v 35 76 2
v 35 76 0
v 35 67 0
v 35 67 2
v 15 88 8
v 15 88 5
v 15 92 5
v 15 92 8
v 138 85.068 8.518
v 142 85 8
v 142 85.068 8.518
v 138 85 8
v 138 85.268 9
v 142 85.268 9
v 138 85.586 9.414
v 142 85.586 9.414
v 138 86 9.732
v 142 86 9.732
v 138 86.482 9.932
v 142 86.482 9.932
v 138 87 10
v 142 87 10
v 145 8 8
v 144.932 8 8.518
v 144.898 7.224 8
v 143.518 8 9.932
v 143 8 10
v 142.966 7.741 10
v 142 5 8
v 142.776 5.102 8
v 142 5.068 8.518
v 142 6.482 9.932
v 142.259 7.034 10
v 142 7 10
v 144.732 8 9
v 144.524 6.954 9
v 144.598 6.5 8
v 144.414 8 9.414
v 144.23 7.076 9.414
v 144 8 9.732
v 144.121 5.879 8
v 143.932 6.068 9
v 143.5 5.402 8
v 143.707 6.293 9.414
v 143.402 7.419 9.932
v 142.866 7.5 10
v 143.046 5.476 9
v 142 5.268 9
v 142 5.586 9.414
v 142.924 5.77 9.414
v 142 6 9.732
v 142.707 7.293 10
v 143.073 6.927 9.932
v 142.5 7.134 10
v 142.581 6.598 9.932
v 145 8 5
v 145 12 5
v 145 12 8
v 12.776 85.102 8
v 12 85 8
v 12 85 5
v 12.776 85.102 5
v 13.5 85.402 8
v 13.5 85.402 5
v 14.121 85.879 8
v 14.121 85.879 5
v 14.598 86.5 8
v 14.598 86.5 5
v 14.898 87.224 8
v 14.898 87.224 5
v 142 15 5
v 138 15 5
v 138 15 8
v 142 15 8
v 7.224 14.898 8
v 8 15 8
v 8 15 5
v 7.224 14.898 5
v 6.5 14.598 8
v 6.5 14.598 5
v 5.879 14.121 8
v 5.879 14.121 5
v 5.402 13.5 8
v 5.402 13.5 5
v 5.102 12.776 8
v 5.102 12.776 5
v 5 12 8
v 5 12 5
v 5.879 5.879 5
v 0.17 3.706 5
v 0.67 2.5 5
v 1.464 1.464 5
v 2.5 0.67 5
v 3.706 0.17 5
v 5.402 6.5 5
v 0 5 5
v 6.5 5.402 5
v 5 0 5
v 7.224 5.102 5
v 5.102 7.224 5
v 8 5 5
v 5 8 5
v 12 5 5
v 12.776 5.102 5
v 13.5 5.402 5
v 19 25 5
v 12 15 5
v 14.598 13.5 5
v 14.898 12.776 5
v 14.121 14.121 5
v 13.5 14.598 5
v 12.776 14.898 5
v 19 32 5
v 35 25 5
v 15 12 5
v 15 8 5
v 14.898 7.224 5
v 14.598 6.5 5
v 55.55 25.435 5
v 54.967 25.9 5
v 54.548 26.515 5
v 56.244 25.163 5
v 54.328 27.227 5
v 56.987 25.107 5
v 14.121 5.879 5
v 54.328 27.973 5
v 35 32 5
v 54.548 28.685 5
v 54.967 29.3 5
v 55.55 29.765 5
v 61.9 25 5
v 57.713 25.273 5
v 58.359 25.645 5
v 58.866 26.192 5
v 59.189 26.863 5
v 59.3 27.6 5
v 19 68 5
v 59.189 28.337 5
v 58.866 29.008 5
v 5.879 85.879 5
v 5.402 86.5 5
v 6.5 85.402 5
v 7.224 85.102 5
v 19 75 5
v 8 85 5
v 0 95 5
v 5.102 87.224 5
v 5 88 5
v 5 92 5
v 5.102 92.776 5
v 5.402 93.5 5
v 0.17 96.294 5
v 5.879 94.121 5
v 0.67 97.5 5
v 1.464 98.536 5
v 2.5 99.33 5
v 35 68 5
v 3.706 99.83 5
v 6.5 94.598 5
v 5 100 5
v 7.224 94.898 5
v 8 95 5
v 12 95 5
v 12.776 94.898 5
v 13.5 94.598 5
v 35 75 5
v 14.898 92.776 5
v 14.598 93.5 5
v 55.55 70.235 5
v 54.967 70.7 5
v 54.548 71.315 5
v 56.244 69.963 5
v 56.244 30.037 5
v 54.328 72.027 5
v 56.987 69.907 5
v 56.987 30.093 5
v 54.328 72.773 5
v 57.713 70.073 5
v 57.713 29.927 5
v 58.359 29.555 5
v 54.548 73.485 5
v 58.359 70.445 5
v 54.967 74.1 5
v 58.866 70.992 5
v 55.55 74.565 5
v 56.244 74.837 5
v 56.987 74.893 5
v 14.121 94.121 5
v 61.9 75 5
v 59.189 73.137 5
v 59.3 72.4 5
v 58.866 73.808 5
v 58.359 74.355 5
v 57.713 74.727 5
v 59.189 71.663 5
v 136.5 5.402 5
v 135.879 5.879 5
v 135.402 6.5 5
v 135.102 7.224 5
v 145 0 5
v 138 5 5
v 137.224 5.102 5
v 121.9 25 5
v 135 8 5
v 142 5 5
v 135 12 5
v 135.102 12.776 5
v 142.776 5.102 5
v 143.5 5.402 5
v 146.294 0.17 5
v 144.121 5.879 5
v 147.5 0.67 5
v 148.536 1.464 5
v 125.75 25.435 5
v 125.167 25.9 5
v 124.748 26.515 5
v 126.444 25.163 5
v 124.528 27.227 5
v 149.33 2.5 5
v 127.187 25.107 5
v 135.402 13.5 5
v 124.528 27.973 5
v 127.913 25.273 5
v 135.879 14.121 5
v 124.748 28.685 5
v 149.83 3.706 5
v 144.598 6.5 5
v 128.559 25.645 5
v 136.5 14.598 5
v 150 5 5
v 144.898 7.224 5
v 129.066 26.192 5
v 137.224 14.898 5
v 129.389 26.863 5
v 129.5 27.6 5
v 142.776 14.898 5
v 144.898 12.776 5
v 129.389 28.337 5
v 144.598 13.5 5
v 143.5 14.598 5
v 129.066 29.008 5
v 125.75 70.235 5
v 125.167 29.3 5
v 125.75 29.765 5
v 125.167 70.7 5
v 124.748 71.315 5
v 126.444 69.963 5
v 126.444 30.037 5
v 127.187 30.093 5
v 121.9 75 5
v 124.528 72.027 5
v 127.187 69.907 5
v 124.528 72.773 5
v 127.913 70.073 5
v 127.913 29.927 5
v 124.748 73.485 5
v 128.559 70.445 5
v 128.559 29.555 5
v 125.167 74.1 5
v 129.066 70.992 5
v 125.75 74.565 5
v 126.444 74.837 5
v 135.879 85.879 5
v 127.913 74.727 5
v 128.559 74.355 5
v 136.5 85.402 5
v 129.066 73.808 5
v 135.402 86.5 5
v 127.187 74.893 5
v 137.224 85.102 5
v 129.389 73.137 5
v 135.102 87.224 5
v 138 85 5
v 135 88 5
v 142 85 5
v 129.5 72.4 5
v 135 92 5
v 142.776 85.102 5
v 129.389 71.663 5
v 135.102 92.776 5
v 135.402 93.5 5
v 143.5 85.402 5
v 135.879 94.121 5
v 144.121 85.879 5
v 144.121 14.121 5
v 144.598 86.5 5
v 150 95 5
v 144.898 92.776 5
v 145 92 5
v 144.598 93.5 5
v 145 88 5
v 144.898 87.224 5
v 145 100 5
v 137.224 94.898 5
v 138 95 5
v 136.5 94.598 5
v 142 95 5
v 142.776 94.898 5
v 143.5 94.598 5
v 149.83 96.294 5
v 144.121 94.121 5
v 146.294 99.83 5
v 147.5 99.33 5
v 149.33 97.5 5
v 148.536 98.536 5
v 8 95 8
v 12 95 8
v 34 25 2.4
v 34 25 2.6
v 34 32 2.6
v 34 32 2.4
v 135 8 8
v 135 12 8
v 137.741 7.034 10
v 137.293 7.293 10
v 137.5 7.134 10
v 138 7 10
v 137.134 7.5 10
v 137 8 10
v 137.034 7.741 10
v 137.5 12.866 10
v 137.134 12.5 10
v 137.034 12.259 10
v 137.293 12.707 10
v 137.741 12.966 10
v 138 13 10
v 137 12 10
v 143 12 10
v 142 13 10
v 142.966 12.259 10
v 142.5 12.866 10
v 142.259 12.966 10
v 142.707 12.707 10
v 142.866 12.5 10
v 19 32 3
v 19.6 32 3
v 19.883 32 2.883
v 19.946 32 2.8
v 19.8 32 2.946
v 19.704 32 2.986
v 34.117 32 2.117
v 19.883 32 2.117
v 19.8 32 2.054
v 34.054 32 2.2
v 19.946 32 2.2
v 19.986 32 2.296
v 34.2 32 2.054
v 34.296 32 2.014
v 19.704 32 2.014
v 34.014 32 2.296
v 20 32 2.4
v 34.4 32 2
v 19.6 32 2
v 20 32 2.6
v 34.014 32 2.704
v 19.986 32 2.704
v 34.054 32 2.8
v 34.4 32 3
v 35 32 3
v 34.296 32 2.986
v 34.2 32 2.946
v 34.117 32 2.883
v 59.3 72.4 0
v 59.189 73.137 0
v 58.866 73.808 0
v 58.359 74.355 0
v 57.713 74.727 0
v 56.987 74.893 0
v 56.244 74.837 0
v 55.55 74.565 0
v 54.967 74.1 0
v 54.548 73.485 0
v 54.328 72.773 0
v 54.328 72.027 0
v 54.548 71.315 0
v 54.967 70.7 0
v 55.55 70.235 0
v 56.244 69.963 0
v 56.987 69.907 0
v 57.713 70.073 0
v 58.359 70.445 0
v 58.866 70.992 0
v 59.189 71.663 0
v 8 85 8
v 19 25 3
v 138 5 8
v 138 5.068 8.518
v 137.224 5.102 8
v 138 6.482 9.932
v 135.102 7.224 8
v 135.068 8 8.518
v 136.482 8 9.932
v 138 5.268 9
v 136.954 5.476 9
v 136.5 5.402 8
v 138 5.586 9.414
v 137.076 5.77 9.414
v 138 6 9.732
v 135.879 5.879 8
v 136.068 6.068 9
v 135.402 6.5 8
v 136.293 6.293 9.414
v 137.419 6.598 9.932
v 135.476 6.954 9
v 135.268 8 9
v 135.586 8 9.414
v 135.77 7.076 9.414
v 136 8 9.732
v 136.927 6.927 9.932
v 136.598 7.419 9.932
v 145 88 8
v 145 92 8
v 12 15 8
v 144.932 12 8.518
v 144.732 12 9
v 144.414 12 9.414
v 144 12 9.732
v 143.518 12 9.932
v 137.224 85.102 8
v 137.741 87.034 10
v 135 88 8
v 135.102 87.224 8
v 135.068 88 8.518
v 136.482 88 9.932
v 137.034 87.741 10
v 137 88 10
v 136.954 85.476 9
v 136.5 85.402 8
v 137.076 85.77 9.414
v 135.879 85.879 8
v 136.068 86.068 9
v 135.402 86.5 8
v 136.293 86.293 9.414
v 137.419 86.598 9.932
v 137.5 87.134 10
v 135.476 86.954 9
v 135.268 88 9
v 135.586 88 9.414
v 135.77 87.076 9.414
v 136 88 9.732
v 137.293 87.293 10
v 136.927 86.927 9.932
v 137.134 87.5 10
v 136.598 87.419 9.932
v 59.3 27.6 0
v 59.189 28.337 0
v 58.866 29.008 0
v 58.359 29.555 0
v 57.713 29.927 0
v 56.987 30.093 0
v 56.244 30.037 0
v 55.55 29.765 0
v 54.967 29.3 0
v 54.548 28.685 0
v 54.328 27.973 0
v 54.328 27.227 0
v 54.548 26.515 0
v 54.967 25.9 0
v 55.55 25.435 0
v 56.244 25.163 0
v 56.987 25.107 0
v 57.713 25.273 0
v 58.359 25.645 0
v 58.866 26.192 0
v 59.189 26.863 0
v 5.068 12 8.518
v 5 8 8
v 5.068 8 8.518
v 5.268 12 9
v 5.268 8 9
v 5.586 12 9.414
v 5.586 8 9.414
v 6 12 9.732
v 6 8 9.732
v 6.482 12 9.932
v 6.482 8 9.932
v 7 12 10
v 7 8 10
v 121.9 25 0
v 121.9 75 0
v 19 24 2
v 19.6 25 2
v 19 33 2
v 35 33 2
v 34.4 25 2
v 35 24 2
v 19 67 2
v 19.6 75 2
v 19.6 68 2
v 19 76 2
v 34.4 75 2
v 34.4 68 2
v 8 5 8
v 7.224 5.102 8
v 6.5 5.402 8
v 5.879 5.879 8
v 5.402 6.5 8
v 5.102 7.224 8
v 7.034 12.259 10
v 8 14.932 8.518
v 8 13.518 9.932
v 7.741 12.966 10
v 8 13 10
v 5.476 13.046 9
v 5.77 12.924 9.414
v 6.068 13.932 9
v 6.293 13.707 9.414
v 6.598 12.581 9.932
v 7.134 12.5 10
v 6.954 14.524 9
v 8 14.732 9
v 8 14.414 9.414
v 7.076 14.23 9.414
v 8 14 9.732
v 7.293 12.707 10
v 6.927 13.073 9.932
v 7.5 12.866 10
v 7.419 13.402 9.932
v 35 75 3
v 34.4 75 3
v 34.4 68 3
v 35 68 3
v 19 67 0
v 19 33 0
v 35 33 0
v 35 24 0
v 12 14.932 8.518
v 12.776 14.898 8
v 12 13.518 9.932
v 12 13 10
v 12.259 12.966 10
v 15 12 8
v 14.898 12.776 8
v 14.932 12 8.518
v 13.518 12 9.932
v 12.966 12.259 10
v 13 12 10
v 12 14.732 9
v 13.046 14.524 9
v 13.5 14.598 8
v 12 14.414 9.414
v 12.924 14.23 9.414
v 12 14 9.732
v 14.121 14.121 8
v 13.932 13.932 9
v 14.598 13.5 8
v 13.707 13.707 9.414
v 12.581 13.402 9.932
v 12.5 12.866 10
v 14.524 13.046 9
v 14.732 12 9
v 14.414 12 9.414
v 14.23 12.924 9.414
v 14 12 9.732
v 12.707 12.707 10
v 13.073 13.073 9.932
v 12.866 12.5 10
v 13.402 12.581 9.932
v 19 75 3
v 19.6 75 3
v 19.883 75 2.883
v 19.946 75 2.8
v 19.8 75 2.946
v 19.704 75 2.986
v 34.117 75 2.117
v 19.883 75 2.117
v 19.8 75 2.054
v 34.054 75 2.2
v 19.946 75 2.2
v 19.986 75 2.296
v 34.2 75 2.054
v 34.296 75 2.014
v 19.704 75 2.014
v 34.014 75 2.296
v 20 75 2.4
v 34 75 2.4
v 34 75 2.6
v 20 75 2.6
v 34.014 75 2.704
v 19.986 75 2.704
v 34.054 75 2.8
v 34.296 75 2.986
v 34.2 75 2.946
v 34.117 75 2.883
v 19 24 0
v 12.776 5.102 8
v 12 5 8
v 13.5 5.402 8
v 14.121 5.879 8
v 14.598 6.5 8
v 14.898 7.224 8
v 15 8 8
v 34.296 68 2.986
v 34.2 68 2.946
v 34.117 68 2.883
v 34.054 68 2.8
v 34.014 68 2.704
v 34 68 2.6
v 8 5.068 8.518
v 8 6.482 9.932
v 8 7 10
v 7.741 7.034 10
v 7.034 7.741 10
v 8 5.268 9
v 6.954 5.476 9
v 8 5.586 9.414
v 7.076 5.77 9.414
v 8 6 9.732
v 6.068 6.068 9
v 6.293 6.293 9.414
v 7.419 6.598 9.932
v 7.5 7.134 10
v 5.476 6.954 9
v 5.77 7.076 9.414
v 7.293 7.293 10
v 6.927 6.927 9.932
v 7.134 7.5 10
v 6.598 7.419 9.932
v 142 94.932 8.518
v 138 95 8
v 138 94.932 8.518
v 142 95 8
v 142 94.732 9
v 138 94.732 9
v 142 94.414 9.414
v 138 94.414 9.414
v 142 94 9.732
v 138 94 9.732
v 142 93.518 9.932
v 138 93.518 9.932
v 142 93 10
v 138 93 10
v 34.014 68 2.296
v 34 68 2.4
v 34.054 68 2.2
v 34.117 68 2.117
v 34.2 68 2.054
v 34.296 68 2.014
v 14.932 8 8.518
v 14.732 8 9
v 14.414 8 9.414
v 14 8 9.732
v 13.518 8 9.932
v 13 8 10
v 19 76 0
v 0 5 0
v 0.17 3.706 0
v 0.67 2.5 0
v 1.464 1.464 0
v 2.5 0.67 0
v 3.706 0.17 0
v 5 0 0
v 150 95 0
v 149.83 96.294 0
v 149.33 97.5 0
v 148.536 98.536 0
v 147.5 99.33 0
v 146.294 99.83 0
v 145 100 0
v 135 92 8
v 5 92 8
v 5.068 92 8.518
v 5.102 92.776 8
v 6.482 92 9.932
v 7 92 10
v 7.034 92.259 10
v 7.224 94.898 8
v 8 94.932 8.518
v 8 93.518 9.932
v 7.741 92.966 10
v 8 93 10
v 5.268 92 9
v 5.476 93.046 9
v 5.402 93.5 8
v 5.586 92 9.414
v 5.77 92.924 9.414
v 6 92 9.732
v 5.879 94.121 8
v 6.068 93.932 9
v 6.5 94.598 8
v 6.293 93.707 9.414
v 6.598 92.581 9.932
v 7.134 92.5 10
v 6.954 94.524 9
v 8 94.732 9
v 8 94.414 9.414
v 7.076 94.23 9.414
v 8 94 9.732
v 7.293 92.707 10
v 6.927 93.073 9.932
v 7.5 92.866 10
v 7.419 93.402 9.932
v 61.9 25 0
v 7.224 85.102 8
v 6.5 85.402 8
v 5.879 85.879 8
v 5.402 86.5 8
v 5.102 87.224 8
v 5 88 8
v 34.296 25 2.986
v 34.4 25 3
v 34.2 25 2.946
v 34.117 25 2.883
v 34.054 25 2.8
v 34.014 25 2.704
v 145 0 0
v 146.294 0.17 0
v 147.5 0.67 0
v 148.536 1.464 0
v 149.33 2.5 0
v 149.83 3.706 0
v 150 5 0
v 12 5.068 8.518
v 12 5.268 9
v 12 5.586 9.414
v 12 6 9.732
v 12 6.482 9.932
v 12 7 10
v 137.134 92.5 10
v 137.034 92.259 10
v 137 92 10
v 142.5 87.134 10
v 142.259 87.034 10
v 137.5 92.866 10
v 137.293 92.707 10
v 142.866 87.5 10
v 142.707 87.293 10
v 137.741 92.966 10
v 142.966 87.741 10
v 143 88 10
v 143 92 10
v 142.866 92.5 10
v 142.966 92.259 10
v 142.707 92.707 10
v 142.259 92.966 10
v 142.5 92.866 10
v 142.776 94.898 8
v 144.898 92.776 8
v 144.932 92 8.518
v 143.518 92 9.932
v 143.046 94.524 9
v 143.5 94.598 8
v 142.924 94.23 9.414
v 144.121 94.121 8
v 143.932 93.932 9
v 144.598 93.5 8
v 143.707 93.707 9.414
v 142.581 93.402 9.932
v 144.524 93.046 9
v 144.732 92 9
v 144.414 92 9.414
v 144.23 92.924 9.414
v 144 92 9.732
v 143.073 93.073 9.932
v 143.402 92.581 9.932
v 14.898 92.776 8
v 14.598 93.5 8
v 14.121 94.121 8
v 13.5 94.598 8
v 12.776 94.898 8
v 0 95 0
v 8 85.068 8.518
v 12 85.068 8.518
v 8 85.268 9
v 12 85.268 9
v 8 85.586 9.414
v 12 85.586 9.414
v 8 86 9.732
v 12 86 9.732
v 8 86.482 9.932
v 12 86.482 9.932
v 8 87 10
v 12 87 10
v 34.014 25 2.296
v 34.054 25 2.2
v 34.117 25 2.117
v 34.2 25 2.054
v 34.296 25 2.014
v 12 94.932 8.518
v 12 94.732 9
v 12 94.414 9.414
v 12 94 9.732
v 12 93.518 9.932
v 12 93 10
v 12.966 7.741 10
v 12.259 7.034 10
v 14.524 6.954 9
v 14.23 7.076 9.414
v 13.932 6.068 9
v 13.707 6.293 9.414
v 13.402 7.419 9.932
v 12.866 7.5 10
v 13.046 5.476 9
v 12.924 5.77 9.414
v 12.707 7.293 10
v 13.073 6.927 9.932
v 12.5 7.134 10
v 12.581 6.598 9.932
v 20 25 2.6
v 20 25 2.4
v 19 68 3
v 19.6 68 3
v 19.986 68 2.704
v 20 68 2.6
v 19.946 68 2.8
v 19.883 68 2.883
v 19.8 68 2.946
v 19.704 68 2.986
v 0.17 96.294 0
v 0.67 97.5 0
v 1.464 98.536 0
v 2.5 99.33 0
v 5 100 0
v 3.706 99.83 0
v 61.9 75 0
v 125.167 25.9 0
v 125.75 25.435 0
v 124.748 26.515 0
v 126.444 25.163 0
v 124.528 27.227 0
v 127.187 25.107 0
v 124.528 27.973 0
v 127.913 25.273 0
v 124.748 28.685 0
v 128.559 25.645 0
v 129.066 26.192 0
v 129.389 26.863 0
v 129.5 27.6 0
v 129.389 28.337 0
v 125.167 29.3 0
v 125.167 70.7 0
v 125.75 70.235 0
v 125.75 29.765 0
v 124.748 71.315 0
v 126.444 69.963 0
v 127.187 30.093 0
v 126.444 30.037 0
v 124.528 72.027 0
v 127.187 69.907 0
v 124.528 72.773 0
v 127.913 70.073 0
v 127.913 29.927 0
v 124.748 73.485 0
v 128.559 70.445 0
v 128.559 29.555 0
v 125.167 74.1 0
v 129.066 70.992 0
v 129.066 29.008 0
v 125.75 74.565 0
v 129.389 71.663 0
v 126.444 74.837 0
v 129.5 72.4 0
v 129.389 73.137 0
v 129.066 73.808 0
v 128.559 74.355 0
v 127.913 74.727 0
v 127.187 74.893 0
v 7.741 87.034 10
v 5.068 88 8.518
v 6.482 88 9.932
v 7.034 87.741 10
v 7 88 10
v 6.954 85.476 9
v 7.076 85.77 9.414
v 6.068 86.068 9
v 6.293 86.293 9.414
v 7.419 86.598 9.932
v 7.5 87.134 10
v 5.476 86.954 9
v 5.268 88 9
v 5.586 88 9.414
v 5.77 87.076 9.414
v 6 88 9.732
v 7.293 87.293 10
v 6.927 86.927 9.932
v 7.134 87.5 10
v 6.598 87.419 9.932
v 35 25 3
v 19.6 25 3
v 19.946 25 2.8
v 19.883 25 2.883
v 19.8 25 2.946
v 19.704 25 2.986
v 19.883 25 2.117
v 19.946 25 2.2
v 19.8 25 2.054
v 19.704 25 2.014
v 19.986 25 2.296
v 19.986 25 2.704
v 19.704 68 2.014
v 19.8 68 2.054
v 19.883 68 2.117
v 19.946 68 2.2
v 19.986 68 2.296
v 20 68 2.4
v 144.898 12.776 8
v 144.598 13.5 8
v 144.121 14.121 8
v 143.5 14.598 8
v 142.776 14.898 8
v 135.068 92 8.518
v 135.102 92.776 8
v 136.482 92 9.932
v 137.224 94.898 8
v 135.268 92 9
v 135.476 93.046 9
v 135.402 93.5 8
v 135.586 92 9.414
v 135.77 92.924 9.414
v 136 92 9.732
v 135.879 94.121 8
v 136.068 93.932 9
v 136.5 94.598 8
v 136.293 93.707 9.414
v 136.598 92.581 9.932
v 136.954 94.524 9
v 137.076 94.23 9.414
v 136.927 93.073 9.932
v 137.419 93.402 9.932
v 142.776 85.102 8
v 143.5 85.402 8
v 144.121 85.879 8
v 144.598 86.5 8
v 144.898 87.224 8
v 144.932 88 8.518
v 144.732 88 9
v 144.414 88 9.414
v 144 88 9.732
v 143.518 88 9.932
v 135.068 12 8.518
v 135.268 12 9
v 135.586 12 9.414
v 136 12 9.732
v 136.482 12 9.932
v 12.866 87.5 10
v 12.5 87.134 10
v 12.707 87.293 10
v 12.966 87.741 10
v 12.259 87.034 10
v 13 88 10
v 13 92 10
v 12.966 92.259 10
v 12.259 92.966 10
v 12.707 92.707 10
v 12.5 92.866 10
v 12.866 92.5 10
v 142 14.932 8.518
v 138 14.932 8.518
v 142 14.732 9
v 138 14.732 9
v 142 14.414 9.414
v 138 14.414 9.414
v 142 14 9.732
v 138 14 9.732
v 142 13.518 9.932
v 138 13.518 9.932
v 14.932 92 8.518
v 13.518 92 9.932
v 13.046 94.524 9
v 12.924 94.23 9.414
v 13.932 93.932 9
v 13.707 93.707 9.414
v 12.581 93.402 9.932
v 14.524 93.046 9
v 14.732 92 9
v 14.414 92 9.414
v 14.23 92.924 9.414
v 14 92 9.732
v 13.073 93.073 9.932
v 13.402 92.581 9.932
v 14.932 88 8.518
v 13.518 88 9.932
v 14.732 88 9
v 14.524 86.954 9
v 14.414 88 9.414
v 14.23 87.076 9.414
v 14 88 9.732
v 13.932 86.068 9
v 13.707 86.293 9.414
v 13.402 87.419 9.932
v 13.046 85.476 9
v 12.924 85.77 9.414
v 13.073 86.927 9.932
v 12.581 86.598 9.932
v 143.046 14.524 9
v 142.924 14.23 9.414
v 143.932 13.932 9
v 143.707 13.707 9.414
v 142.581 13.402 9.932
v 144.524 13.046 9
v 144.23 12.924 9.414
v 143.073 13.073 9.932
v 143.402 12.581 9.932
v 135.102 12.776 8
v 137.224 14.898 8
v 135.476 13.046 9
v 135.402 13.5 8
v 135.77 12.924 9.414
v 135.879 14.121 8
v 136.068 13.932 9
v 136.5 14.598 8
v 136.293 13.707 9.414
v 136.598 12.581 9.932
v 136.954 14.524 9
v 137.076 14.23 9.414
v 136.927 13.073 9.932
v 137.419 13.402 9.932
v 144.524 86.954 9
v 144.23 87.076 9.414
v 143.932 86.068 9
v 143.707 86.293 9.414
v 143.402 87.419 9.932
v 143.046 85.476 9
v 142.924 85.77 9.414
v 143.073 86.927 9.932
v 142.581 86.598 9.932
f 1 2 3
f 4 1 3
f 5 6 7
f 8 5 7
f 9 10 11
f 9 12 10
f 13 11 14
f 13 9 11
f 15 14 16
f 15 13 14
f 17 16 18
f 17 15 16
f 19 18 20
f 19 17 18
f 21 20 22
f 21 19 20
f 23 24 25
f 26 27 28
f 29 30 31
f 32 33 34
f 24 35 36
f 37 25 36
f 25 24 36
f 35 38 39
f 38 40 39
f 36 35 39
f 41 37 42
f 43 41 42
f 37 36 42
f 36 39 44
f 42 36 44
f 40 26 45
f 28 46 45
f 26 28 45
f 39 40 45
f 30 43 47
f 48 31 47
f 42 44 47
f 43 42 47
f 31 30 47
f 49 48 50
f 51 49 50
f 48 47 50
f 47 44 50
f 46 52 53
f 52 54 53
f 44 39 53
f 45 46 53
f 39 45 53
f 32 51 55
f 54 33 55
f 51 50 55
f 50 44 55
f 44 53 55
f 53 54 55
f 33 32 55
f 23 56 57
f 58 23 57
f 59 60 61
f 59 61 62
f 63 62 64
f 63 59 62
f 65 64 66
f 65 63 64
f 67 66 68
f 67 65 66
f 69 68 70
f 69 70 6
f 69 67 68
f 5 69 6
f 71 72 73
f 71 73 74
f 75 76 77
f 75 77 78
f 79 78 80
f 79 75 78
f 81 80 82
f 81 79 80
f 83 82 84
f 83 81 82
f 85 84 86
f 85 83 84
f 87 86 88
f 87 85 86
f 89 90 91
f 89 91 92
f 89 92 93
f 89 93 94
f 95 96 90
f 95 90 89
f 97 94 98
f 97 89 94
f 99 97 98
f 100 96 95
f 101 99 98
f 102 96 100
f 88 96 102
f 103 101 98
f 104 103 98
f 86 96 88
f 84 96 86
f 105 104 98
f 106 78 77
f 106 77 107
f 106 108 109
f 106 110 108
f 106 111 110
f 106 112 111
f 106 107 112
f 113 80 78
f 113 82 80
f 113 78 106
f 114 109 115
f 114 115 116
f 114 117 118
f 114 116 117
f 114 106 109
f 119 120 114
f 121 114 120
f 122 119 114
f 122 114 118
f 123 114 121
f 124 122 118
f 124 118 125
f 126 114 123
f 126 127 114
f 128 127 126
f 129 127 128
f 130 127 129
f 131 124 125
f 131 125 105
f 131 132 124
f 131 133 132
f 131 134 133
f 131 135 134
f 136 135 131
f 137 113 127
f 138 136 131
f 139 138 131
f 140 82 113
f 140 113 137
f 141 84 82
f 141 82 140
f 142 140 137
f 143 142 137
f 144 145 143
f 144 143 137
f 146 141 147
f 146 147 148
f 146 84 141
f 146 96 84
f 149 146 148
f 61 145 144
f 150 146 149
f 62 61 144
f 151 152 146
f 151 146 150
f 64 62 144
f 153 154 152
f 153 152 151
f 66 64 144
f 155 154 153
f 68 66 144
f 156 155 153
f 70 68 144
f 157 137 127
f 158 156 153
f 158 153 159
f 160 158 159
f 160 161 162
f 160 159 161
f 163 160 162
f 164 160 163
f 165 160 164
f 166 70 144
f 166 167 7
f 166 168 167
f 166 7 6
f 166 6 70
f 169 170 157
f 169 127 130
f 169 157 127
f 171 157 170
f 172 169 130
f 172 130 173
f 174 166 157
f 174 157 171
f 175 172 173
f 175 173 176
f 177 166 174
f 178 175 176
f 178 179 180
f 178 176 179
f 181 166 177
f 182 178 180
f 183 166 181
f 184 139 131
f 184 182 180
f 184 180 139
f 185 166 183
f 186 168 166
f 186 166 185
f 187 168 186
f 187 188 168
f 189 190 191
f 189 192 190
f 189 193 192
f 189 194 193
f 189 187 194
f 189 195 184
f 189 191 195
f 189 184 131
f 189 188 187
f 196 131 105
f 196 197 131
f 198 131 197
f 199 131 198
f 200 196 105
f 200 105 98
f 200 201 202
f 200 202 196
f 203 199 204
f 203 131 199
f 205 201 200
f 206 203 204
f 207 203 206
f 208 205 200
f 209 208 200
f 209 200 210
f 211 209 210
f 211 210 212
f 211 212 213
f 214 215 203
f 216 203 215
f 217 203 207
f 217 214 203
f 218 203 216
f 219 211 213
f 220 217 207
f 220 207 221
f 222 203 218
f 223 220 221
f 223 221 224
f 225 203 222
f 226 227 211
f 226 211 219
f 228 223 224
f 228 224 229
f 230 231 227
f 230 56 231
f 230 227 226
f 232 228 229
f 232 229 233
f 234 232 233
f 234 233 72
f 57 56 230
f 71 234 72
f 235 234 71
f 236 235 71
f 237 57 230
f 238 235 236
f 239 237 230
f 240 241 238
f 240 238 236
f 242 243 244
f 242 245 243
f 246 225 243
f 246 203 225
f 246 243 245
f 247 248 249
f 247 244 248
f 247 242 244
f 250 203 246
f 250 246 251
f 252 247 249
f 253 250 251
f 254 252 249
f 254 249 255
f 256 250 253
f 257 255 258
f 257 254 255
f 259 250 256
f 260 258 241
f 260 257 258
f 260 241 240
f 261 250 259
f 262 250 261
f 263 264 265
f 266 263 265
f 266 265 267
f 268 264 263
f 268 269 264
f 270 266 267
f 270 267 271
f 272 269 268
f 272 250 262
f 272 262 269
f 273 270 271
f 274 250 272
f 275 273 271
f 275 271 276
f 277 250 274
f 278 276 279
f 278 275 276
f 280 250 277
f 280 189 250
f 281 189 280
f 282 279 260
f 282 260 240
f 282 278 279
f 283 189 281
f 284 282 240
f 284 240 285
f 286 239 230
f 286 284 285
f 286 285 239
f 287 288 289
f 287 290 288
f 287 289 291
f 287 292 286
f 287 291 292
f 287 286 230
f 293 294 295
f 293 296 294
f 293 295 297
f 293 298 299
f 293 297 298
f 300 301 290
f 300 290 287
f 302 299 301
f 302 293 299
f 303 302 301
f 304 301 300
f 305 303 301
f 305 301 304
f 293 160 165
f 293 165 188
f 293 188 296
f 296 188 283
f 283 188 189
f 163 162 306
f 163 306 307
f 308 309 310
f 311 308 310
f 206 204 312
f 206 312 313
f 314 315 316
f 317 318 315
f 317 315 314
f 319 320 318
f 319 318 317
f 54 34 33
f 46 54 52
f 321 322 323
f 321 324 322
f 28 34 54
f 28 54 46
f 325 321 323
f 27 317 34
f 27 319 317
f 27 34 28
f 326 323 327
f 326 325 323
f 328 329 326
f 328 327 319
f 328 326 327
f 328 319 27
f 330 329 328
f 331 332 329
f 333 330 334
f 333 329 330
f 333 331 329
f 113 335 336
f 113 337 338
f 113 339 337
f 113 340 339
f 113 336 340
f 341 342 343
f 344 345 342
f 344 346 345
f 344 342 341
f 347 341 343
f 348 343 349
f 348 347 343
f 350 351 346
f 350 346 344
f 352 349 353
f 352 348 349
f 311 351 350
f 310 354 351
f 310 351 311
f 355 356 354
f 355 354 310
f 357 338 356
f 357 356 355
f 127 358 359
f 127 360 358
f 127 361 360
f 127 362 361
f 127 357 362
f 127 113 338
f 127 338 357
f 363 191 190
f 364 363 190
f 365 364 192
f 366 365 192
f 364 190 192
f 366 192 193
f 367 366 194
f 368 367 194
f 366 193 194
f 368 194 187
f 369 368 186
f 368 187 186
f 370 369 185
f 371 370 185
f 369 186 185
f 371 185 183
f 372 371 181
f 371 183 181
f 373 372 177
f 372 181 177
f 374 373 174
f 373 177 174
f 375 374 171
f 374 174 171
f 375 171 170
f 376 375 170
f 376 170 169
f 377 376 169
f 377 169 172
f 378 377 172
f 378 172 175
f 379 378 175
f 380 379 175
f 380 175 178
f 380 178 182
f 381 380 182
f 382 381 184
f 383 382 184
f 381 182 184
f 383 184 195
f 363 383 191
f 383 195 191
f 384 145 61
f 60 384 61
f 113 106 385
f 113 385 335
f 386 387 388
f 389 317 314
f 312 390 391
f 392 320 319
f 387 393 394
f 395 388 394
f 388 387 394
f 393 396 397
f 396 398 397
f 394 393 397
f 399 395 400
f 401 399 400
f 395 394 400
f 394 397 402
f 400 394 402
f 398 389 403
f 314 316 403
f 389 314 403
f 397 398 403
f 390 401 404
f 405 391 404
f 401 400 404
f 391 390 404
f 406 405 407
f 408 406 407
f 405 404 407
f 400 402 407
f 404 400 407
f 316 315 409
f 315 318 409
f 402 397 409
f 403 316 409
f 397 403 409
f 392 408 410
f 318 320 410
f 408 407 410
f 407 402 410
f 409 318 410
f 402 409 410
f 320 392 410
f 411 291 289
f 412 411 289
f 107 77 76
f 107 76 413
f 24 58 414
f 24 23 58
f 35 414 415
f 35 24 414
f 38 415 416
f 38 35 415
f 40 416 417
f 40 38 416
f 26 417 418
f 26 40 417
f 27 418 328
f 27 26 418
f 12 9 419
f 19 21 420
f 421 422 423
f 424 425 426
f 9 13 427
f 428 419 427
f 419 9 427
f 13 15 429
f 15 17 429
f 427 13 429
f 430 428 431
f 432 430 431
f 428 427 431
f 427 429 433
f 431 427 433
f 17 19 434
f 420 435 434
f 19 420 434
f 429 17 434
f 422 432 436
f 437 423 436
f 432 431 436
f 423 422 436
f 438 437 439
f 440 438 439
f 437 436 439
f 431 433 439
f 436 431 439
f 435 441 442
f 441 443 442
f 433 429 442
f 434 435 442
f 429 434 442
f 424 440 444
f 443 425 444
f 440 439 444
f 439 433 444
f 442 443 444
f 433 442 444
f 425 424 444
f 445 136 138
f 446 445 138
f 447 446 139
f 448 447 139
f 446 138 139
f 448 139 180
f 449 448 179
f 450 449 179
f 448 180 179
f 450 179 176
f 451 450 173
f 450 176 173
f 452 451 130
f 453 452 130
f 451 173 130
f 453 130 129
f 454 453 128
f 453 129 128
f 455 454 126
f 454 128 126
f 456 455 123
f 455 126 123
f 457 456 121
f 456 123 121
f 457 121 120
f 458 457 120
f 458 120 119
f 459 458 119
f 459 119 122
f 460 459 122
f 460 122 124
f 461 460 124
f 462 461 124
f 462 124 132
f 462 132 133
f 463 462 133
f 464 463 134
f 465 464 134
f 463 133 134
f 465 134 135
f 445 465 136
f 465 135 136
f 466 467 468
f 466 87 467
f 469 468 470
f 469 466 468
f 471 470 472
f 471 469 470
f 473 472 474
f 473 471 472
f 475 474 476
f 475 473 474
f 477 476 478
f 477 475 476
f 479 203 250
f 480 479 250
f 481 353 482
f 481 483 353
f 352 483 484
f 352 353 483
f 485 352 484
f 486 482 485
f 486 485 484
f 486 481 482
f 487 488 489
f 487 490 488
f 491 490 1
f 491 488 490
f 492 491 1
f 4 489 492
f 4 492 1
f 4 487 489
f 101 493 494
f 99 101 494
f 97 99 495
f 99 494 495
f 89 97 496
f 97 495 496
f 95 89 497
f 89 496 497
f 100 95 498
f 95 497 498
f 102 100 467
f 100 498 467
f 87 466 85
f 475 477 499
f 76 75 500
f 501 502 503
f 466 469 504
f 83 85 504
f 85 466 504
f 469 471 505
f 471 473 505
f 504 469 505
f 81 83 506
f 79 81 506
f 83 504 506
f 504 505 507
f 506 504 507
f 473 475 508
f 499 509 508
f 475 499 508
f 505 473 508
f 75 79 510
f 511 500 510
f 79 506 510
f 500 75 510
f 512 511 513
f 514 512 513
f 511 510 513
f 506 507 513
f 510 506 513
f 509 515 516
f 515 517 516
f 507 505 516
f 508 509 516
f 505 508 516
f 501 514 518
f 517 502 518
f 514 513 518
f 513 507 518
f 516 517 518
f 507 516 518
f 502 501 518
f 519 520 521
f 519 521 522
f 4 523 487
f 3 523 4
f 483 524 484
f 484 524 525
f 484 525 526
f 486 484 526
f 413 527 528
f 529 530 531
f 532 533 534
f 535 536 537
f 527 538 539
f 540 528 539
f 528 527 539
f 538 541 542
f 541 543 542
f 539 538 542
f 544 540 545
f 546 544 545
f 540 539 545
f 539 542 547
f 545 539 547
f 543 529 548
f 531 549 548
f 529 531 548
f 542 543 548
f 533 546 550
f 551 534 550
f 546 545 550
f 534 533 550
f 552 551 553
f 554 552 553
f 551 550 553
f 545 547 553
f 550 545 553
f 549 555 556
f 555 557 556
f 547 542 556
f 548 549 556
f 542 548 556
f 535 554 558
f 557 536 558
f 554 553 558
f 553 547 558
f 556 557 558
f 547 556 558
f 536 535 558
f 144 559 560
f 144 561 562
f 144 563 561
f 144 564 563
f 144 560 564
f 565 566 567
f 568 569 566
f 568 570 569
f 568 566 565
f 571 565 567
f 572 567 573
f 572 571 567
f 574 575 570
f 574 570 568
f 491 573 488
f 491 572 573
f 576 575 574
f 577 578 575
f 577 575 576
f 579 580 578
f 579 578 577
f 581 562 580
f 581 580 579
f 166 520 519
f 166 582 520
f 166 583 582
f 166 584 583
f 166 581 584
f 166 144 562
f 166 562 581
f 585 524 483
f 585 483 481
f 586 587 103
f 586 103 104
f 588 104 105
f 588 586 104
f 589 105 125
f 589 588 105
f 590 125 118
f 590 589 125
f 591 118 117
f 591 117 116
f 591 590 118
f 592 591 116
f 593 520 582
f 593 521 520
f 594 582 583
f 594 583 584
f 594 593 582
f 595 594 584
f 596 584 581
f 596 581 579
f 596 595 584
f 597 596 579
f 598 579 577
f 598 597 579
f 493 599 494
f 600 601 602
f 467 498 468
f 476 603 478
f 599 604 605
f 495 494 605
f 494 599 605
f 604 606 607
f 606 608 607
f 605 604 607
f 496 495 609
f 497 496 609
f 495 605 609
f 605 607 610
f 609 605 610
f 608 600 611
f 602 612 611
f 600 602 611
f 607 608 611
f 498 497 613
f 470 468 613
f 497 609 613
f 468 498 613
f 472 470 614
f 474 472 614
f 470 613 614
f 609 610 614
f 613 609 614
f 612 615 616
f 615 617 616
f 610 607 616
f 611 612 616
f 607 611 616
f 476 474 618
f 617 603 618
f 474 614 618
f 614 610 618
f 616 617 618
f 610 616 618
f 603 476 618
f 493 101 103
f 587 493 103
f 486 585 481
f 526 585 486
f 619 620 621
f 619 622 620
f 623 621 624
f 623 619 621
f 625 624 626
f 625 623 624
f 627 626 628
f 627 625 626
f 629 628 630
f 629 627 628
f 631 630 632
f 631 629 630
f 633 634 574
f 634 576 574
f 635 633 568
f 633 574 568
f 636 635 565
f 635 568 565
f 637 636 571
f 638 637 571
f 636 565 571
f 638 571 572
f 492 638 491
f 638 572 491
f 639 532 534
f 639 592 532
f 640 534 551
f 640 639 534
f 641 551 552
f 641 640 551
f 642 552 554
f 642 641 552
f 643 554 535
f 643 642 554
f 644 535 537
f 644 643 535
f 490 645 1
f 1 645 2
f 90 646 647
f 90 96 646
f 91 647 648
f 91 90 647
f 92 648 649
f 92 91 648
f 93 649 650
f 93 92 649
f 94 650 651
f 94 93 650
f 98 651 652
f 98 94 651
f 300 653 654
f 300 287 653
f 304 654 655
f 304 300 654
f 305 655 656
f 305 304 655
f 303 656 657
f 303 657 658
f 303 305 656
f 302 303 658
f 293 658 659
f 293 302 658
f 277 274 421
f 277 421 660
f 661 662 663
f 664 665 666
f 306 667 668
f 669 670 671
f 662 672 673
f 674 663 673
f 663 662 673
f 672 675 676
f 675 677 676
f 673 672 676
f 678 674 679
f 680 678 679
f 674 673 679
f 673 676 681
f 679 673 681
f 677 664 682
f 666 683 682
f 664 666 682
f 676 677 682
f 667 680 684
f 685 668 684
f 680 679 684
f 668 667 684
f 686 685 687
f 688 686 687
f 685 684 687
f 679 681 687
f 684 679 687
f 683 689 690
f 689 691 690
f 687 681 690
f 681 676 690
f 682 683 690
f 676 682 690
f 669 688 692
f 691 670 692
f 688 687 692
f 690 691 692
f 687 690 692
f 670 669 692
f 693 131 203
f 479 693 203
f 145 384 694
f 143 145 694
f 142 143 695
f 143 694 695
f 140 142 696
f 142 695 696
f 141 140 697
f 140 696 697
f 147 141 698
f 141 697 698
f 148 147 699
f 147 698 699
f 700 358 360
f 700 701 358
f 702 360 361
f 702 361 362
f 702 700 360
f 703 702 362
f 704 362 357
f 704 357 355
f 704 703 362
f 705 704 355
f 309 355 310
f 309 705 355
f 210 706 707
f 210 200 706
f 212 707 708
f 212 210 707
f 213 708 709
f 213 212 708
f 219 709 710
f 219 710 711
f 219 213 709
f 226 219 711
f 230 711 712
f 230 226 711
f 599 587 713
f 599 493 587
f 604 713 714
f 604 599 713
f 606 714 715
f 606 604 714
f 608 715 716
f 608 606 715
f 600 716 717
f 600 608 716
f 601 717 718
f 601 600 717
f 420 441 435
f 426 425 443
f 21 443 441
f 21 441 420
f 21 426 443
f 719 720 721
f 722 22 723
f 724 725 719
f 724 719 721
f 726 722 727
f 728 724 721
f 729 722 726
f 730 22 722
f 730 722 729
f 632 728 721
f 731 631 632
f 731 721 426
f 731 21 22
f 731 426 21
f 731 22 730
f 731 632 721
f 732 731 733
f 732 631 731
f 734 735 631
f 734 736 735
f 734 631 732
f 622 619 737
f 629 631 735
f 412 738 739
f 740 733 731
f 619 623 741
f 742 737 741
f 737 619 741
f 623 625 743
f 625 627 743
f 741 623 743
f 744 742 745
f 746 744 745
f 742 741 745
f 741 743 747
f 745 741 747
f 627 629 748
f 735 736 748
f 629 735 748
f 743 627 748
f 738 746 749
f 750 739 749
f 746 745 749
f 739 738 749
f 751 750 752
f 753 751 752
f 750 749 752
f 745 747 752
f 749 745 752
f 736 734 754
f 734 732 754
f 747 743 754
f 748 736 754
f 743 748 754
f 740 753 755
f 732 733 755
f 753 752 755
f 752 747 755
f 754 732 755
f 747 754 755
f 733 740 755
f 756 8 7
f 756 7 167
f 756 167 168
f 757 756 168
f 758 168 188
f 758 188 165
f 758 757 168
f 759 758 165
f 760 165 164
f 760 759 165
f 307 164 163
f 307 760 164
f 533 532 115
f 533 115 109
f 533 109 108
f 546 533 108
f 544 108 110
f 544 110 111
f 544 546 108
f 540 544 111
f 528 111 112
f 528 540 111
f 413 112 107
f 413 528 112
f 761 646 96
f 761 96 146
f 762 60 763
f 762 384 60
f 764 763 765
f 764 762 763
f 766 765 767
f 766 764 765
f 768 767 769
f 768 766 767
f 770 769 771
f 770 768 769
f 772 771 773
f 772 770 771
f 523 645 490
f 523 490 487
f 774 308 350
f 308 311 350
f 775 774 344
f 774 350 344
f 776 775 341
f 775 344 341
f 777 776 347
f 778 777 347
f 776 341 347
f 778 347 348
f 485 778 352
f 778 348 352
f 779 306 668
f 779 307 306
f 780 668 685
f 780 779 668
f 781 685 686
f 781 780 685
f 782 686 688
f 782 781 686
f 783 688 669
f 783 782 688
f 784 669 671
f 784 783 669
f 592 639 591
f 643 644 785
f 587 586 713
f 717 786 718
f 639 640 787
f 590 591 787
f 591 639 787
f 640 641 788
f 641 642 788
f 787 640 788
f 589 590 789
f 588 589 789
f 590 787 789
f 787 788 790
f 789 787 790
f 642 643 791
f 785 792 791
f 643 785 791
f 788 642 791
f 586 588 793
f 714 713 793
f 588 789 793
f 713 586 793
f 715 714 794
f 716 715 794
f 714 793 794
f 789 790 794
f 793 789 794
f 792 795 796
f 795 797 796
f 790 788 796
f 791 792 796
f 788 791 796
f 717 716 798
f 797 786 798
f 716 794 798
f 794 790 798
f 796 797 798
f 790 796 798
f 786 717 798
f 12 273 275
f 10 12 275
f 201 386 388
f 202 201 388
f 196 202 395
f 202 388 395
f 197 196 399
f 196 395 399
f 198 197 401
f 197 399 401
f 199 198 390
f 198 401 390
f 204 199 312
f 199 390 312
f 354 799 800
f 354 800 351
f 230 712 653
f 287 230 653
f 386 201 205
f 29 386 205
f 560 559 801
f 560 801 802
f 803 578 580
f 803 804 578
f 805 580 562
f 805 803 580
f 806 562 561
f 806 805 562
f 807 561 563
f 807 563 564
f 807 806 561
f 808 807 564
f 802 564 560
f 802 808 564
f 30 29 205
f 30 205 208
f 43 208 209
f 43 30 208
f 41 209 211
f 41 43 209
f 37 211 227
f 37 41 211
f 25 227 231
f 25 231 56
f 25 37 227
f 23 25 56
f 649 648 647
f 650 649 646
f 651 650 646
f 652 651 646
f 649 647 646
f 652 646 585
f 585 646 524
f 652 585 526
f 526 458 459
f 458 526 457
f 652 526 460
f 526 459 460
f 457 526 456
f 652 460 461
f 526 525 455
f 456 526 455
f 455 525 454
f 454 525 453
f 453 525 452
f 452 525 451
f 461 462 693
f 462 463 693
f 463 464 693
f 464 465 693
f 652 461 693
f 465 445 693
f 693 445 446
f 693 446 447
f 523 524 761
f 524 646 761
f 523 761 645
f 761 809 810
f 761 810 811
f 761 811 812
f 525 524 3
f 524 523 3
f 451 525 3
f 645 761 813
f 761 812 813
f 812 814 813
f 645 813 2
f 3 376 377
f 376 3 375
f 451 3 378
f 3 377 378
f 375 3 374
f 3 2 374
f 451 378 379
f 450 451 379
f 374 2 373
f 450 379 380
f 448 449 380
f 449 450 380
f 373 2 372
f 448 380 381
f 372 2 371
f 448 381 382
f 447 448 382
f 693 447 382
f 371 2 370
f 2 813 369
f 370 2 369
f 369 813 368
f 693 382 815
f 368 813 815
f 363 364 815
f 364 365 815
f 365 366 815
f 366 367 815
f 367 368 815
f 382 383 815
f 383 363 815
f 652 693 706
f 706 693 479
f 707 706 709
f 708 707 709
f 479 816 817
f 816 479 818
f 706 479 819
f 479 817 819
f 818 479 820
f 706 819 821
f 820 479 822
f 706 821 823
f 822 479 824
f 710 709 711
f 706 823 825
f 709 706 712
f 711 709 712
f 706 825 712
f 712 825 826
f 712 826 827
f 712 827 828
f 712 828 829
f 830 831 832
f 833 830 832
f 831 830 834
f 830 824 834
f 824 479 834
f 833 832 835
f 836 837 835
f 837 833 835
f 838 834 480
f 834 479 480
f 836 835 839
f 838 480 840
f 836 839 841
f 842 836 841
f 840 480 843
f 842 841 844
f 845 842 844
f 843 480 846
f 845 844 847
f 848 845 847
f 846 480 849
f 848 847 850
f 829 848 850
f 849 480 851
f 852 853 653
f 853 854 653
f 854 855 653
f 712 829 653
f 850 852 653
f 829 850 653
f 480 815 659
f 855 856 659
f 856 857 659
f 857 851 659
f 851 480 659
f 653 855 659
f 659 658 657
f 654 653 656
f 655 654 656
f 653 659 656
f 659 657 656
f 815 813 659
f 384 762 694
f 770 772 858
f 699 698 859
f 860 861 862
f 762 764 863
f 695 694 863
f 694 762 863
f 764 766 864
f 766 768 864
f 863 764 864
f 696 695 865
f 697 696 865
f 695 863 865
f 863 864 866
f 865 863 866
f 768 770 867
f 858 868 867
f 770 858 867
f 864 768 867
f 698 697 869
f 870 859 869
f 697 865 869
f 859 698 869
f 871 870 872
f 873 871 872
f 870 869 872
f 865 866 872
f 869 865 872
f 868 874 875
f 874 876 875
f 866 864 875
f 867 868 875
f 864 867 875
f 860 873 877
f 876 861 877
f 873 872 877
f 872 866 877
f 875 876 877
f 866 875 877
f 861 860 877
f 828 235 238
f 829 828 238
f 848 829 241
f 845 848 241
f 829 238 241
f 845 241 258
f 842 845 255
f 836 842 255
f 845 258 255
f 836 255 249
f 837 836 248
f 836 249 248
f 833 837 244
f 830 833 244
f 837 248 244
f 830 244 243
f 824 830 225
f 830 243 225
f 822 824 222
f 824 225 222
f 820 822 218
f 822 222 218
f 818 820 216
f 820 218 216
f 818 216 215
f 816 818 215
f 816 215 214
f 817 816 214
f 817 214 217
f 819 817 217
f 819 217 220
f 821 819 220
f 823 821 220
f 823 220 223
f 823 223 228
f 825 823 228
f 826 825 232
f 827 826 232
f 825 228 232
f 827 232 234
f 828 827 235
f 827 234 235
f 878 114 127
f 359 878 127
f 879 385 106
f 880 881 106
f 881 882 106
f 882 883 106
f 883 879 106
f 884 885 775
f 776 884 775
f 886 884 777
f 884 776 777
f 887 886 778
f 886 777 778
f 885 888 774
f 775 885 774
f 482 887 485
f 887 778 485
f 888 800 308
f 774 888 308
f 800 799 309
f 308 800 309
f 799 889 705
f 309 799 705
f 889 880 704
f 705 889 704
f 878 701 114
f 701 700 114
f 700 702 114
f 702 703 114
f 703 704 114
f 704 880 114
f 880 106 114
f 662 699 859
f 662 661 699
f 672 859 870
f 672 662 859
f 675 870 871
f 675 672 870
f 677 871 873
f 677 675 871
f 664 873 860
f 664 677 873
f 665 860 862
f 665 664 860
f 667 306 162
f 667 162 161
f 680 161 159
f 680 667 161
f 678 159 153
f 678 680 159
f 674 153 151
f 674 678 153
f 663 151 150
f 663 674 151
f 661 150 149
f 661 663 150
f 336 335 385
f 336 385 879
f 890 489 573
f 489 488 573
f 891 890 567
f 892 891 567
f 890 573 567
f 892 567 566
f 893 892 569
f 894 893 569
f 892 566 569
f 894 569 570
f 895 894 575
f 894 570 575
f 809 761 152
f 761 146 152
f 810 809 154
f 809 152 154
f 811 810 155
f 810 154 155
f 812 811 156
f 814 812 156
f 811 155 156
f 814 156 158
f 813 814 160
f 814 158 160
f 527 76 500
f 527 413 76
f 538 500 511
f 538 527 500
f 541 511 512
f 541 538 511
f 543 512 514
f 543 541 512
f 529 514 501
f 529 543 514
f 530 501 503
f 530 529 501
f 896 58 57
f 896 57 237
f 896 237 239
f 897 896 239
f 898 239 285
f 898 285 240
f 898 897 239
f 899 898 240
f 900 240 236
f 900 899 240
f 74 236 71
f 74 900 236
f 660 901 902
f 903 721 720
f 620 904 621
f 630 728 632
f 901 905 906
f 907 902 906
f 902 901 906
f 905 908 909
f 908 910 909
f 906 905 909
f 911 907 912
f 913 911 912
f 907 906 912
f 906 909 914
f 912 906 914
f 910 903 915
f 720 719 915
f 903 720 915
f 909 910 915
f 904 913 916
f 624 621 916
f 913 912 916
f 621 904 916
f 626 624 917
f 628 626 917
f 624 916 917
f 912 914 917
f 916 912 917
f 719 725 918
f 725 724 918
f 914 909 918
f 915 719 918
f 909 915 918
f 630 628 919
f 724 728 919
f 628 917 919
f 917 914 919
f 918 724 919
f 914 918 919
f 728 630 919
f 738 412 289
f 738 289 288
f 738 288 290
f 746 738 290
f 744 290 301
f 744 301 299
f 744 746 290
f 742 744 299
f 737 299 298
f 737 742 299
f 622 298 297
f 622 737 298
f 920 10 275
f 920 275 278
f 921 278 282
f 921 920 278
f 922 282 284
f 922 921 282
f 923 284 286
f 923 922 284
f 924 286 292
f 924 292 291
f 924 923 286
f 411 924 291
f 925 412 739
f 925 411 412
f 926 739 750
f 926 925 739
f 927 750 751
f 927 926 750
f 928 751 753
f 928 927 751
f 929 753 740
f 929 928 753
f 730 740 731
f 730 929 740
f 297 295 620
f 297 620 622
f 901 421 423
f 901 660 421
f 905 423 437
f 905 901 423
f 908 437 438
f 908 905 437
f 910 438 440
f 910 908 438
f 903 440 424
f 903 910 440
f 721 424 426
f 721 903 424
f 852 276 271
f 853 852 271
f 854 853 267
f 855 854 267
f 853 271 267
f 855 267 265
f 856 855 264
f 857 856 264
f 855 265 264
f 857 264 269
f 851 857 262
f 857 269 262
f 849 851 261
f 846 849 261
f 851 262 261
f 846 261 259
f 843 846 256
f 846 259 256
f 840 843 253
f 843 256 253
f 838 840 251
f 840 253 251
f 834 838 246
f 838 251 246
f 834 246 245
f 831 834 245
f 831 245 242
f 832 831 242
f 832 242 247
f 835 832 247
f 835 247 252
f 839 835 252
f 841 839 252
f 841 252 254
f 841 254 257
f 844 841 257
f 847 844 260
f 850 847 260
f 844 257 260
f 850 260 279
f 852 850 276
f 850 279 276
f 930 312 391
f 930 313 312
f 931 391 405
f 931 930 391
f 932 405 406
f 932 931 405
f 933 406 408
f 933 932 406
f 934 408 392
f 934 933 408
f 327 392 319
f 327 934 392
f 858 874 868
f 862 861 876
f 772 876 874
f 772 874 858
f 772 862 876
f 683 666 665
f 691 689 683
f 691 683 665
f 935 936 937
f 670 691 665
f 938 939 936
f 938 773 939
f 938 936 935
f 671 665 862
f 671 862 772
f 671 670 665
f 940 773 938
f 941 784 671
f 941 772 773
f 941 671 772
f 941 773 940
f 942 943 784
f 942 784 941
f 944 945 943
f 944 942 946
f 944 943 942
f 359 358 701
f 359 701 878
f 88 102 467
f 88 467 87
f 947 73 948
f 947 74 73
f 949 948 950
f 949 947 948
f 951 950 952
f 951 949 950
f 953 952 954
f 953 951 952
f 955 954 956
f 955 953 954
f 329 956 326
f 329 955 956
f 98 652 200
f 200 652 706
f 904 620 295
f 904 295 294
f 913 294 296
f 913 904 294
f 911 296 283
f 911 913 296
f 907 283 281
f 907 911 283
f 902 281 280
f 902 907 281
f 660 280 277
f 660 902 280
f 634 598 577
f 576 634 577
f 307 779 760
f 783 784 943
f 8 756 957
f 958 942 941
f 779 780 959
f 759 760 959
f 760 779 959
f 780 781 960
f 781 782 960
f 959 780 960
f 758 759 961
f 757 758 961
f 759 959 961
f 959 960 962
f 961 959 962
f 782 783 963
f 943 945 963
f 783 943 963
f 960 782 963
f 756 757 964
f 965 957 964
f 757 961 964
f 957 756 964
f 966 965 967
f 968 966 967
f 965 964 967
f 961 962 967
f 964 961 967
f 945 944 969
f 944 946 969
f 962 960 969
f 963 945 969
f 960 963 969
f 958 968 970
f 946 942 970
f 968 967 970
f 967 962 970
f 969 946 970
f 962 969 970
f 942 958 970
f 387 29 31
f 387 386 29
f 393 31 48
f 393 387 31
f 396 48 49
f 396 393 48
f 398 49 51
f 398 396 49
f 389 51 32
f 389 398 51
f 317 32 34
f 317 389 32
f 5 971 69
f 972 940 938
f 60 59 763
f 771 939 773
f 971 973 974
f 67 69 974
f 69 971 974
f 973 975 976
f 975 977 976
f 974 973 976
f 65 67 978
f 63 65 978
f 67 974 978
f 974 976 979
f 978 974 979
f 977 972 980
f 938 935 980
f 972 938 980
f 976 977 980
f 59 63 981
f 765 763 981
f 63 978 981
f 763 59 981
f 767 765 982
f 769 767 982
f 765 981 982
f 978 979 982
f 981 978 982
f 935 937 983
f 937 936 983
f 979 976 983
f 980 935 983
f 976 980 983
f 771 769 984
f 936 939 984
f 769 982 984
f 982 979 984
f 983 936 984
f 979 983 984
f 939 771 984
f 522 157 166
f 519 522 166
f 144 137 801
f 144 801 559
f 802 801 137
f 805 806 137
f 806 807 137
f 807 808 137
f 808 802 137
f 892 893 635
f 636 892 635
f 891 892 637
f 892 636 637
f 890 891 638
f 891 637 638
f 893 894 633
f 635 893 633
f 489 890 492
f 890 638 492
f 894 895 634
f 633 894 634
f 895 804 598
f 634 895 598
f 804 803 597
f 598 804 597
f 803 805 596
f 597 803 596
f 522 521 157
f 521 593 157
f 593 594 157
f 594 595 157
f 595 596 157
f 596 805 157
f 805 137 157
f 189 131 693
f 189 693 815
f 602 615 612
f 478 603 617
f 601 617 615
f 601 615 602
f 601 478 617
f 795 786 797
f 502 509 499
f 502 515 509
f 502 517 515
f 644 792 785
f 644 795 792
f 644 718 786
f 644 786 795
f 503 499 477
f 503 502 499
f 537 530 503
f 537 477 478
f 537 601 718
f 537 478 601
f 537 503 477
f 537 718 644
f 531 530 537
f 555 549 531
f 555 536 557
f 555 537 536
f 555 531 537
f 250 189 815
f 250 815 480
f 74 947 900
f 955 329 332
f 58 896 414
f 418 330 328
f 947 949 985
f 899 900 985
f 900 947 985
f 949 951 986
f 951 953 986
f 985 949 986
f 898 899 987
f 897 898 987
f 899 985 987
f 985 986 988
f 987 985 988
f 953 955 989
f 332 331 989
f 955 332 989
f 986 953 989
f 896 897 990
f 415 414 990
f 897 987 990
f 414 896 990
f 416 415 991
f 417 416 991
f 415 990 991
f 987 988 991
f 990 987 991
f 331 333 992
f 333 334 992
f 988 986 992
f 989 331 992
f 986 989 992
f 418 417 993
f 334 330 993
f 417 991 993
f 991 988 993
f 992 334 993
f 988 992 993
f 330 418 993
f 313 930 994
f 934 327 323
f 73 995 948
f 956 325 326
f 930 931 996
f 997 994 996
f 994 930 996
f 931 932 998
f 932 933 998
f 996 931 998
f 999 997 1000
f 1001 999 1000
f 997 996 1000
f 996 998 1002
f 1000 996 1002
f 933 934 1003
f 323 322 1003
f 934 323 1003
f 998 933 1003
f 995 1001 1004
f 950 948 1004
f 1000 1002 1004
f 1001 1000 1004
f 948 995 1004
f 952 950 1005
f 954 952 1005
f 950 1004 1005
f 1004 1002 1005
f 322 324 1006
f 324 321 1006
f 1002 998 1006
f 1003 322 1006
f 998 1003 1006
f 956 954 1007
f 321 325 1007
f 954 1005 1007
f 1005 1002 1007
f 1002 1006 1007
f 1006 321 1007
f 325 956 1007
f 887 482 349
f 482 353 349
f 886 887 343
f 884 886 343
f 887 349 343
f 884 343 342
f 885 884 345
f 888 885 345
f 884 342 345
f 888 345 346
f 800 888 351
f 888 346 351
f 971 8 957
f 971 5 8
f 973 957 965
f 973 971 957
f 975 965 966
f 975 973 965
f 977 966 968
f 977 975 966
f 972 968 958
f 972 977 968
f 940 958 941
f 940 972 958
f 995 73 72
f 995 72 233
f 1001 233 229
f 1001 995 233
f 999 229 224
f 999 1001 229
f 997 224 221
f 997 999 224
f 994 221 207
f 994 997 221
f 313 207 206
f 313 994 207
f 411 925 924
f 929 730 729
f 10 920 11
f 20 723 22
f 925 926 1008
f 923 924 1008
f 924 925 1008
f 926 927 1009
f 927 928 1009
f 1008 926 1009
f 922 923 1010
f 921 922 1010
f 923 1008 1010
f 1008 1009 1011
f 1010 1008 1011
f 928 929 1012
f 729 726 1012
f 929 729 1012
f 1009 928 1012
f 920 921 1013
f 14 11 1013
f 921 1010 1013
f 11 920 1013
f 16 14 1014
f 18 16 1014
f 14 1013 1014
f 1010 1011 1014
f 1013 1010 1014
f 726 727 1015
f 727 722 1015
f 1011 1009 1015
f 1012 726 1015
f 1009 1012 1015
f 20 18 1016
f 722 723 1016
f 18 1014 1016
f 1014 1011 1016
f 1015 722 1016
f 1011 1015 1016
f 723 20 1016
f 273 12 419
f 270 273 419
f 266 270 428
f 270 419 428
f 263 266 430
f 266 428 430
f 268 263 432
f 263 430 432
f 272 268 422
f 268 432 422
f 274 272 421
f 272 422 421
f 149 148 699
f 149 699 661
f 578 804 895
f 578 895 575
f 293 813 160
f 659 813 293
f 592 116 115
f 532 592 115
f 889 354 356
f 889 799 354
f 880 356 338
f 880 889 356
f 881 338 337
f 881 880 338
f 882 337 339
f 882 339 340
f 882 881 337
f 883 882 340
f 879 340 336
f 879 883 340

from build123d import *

# Parameters (mm, degrees)
SKETCH_W        = 150
SKETCH_H        = 100
PAD_DEPTH       = 5
FILLET_R        = 5
SKETCH001_W     = 10
SKETCH001_H     = 10
PAD001_DEPTH    = 5
FILLET001_R     = 3
FILLET002_R     = 2
SKETCH002_R     = 2.5
POCKET_DEPTH    = 5
SKETCH003_W     = 60
SKETCH003_H     = 50
POCKET001_DEPTH = 5.001
SKETCH004_W     = 14
SKETCH004_H     = 7
POCKET002_DEPTH = 5.001
SKETCH005_W     = 16
SKETCH005_H     = 7
POCKET003_DEPTH = 2
SKETCH006_W     = 16
SKETCH006_H     = 9
POCKET004_DEPTH = 2
FILLET003_R     = 0.4


with BuildPart() as part:
    # Sketch → Pad (new body)
    with BuildSketch(Plane.XY):
        with Locations((75, 50)):
            Rectangle(SKETCH_W, SKETCH_H)
    extrude(amount=PAD_DEPTH)

    # Fillet
    fillet_edges = [part.edges().sort_by_distance(p)[0] for p in [
        (0, 0, 2.5),
        (150, 0, 2.5),
        (150, 100, 2.5),
        (0, 100, 2.5),
    ]]
    fillet(fillet_edges, radius=FILLET_R)

    # Sketch001 → Pad001 (new body)
    with BuildSketch(Plane.XY.offset(5)):
        with Locations((10, 10)):
            Rectangle(SKETCH001_W, SKETCH001_H)
        with Locations((140, 90)):
            Rectangle(SKETCH001_W, SKETCH001_H)
        with Locations((10, 90)):
            Rectangle(SKETCH001_W, SKETCH001_H)
        with Locations((140, 10)):
            Rectangle(SKETCH001_W, SKETCH001_H)
    extrude(amount=PAD001_DEPTH)

    # Fillet001
    fillet001_edges = [part.edges().sort_by_distance(p)[0] for p in [
        (5, 5, 7.5),
        (15, 5, 7.5),
        (5, 15, 7.5),
        (15, 15, 7.5),
        (5, 95, 7.5),
        (15, 95, 7.5),
        (5, 85, 7.5),
        (15, 85, 7.5),
        (135, 5, 7.5),
        (145, 5, 7.5),
        (145, 15, 7.5),
        (135, 85, 7.5),
        (145, 85, 7.5),
        (145, 95, 7.5),
        (135, 95, 7.5),
        (135, 15, 7.5),
    ]]
    fillet(fillet001_edges, radius=FILLET001_R)

    # Fillet002
    fillet002_edges = [part.edges().sort_by_distance(p)[0] for p in [
        (10, 15, 10),
        (140, 15, 10),
        (140, 95, 10),
        (10, 95, 10),
    ]]
    fillet(fillet002_edges, radius=FILLET002_R)

    # Sketch002 → Pocket (cut)
    with BuildSketch(Plane.XY.offset(5)):
        with Locations((56.8, 72.4)):
            Circle(SKETCH002_R)
        with Locations((127, 72.4)):
            Circle(SKETCH002_R)
        with Locations((56.8, 27.6)):
            Circle(SKETCH002_R)
        with Locations((127, 27.6)):
            Circle(SKETCH002_R)
    extrude(amount=-POCKET_DEPTH, mode=Mode.SUBTRACT)

    # Sketch003 → Pocket001 (cut, through all)
    with BuildSketch(Plane.XY.offset(5)):
        with Locations((91.9, 50)):
            Rectangle(SKETCH003_W, SKETCH003_H)
    extrude(amount=-POCKET001_DEPTH, mode=Mode.SUBTRACT)

    # Sketch004 → Pocket002 (cut, through all)
    with BuildSketch(Plane.XY.offset(5)):
        with Locations((27, 71.5)):
            Rectangle(SKETCH004_W, SKETCH004_H)
        with Locations((27, 28.5)):
            Rectangle(SKETCH004_W, SKETCH004_H)
    extrude(amount=-POCKET002_DEPTH, mode=Mode.SUBTRACT)

    # Sketch005 → Pocket003 (cut)
    with BuildSketch(Plane.XY.offset(5)):
        with Locations((27, 71.5)):
            Rectangle(SKETCH005_W, SKETCH005_H)
        with Locations((27, 28.5)):
            Rectangle(SKETCH005_W, SKETCH005_H)
    extrude(amount=-POCKET003_DEPTH, mode=Mode.SUBTRACT)

    # Sketch006 → Pocket004 (cut)
    with BuildSketch(Plane(origin=(0, 0, 0), x_dir=(1, 0, 0), z_dir=(0, 0, -1))):
        with Locations((27, -28.5)):
            Rectangle(SKETCH006_W, SKETCH006_H)
        with Locations((27, -71.5)):
            Rectangle(SKETCH006_W, SKETCH006_H)
    extrude(amount=-POCKET004_DEPTH, mode=Mode.SUBTRACT)

    # Fillet003
    fillet003_edges = [part.edges().sort_by_distance(p)[0] for p in [
        (34, 28.5, 3),
        (34, 28.5, 2),
        (20, 28.5, 3),
        (20, 28.5, 2),
        (20, 71.5, 3),
        (20, 71.5, 2),
        (34, 71.5, 3),
        (34, 71.5, 2),
    ]]
    fillet(fillet003_edges, radius=FILLET003_R)


solid = part.part
